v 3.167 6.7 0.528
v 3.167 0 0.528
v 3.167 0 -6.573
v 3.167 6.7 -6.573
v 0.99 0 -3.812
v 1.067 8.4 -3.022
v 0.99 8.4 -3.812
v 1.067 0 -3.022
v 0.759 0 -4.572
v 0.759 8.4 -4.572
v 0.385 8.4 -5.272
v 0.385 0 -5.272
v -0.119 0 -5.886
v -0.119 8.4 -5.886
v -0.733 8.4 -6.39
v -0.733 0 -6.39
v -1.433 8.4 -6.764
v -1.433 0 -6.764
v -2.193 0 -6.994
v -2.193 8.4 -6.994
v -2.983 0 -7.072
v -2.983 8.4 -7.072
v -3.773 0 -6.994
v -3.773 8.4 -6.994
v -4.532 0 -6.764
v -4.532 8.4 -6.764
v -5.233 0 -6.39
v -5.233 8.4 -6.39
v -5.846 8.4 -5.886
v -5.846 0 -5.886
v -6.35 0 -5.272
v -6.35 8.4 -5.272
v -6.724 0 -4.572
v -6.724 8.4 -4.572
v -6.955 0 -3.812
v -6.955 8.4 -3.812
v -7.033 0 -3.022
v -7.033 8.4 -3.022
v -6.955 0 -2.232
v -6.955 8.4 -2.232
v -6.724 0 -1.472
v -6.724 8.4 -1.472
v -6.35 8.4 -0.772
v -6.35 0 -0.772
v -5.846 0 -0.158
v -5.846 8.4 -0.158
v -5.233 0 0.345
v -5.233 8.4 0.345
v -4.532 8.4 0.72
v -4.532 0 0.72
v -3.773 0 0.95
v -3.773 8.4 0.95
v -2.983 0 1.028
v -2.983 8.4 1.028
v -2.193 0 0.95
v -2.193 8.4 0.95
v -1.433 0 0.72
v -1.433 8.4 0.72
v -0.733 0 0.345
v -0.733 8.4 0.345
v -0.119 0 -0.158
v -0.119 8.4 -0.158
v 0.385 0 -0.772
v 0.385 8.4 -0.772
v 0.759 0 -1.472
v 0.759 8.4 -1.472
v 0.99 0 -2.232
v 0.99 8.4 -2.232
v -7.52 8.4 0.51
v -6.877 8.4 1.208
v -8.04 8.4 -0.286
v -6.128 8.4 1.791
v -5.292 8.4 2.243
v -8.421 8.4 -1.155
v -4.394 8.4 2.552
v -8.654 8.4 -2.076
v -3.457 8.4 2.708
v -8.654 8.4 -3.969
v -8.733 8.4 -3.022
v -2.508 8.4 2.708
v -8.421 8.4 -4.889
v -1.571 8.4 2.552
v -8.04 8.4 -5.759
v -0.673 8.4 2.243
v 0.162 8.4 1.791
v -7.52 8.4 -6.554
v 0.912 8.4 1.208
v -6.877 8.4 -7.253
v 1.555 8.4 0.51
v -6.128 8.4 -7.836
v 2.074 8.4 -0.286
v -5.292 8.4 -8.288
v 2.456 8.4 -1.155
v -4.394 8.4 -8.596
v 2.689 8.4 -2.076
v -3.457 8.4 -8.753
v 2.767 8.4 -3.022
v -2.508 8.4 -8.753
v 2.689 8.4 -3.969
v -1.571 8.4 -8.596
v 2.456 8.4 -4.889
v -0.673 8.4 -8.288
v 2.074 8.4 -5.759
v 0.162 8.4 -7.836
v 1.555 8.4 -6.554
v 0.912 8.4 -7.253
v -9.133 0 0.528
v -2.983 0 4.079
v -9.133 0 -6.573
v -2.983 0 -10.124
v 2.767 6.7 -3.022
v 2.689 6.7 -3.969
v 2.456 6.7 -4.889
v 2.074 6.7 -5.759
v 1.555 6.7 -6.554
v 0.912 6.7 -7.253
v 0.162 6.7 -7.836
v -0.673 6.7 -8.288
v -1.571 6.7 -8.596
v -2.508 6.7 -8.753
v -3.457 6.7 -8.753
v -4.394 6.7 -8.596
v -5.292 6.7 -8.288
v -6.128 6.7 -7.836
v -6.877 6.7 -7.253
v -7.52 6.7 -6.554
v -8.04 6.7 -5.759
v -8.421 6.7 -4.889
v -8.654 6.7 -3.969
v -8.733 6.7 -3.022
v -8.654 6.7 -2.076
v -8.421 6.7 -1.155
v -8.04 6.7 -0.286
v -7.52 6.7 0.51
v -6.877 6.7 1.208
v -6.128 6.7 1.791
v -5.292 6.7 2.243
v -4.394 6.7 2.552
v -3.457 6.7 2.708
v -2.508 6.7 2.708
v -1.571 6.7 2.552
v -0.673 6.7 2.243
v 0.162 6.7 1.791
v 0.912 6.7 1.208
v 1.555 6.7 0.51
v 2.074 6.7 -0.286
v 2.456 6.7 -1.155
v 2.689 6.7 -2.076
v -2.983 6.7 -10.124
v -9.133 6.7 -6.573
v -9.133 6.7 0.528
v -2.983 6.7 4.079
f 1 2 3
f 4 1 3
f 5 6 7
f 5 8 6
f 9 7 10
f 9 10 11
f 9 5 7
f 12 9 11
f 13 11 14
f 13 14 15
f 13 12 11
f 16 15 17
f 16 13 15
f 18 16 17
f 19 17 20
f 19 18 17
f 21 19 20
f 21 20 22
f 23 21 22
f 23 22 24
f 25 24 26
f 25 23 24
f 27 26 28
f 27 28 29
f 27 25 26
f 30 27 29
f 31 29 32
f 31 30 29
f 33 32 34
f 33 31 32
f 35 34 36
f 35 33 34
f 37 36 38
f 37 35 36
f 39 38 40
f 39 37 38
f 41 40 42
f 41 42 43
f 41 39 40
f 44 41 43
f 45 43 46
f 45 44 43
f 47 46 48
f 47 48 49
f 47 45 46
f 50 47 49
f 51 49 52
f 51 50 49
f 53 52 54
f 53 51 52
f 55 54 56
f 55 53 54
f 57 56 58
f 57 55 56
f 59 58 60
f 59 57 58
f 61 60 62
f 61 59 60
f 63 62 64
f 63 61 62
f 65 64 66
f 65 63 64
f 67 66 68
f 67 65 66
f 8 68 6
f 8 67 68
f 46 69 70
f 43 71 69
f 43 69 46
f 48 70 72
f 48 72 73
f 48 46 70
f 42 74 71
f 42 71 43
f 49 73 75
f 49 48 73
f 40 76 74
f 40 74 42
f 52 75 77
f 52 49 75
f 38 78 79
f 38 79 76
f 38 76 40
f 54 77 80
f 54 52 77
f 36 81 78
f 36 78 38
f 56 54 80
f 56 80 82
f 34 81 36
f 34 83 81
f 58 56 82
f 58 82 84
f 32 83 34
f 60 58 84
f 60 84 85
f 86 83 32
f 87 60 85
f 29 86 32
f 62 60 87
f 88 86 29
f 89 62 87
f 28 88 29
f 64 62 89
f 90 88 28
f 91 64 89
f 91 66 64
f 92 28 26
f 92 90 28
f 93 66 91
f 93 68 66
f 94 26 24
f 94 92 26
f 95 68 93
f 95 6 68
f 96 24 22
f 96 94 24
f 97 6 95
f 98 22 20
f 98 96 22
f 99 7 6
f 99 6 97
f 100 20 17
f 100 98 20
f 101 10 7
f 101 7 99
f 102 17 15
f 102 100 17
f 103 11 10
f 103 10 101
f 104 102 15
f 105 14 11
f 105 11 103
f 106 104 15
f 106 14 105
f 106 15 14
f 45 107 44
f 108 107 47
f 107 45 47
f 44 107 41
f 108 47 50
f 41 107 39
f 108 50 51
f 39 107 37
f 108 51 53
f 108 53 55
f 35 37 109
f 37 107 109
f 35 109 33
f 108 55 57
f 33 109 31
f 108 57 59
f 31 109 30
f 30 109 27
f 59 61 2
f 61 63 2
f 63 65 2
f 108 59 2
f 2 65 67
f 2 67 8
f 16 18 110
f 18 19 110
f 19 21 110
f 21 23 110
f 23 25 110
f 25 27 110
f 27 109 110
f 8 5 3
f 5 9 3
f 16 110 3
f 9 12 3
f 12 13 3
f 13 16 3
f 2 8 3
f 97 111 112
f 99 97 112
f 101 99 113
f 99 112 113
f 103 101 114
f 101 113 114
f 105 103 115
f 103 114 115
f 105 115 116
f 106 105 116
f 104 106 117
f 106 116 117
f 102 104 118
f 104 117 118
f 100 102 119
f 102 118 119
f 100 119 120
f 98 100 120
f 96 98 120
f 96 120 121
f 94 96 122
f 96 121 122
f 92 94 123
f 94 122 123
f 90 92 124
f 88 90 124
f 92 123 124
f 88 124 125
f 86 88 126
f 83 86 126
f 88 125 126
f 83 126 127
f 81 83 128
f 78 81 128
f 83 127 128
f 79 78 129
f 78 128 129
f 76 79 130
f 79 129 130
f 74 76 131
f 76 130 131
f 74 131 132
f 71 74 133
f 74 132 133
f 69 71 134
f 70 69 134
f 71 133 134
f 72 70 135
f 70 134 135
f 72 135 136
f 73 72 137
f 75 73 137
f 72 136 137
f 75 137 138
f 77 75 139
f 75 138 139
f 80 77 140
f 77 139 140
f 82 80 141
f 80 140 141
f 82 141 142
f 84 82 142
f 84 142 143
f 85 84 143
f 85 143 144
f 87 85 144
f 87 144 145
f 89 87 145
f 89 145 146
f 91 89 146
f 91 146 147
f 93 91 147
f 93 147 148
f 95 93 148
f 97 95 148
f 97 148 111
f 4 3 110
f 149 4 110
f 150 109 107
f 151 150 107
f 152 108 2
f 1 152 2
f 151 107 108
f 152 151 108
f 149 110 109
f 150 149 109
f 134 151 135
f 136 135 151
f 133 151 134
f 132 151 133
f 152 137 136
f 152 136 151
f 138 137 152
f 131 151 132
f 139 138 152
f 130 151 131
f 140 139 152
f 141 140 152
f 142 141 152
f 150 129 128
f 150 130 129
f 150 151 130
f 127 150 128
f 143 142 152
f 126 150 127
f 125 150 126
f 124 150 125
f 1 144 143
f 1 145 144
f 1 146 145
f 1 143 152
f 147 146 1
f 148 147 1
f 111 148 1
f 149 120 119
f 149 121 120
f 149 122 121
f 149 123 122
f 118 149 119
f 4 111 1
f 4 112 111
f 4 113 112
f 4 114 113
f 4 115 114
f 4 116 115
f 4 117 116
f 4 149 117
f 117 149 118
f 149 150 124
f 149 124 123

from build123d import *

# Parameters (mm, degrees)
SKETCH1_R           = 4.05
BOSS_EXTRUDE1_DEPTH = 6.7
SKETCH2_R           = 5.75
SKETCH2_R_2         = 4.05
BOSS_EXTRUDE2_DEPTH = 1.7


with BuildPart() as part:
    # Sketch1 → Boss-Extrude1 (new body)
    with BuildSketch(Plane(origin=(0, 0, 0), x_dir=(1, 0, 0), z_dir=(0, 1, 0))):
        Polygon((3.167381974, -0.528493855), (3.167381974, 6.572914456), (-2.982618026, 10.123618611), (-9.132618026, 6.572914456), (-9.132618026, -0.528493855), (-2.982618026, -4.079198011), align=None)
        with Locations((-2.982618026, 3.0222103)):
            Circle(SKETCH1_R, mode=Mode.SUBTRACT)
    extrude(amount=BOSS_EXTRUDE1_DEPTH)

    # Sketch2 → Boss-Extrude2 (add)
    with BuildSketch(Plane(origin=(0, 6.7, 0), x_dir=(1, 0, 0), z_dir=(0, 1, 0))):
        with Locations((-2.982618026, 3.0222103)):
            Circle(SKETCH2_R)
        with Locations((-2.982618026, 3.0222103)):
            Circle(SKETCH2_R_2, mode=Mode.SUBTRACT)
    extrude(amount=BOSS_EXTRUDE2_DEPTH)


solid = part.part
